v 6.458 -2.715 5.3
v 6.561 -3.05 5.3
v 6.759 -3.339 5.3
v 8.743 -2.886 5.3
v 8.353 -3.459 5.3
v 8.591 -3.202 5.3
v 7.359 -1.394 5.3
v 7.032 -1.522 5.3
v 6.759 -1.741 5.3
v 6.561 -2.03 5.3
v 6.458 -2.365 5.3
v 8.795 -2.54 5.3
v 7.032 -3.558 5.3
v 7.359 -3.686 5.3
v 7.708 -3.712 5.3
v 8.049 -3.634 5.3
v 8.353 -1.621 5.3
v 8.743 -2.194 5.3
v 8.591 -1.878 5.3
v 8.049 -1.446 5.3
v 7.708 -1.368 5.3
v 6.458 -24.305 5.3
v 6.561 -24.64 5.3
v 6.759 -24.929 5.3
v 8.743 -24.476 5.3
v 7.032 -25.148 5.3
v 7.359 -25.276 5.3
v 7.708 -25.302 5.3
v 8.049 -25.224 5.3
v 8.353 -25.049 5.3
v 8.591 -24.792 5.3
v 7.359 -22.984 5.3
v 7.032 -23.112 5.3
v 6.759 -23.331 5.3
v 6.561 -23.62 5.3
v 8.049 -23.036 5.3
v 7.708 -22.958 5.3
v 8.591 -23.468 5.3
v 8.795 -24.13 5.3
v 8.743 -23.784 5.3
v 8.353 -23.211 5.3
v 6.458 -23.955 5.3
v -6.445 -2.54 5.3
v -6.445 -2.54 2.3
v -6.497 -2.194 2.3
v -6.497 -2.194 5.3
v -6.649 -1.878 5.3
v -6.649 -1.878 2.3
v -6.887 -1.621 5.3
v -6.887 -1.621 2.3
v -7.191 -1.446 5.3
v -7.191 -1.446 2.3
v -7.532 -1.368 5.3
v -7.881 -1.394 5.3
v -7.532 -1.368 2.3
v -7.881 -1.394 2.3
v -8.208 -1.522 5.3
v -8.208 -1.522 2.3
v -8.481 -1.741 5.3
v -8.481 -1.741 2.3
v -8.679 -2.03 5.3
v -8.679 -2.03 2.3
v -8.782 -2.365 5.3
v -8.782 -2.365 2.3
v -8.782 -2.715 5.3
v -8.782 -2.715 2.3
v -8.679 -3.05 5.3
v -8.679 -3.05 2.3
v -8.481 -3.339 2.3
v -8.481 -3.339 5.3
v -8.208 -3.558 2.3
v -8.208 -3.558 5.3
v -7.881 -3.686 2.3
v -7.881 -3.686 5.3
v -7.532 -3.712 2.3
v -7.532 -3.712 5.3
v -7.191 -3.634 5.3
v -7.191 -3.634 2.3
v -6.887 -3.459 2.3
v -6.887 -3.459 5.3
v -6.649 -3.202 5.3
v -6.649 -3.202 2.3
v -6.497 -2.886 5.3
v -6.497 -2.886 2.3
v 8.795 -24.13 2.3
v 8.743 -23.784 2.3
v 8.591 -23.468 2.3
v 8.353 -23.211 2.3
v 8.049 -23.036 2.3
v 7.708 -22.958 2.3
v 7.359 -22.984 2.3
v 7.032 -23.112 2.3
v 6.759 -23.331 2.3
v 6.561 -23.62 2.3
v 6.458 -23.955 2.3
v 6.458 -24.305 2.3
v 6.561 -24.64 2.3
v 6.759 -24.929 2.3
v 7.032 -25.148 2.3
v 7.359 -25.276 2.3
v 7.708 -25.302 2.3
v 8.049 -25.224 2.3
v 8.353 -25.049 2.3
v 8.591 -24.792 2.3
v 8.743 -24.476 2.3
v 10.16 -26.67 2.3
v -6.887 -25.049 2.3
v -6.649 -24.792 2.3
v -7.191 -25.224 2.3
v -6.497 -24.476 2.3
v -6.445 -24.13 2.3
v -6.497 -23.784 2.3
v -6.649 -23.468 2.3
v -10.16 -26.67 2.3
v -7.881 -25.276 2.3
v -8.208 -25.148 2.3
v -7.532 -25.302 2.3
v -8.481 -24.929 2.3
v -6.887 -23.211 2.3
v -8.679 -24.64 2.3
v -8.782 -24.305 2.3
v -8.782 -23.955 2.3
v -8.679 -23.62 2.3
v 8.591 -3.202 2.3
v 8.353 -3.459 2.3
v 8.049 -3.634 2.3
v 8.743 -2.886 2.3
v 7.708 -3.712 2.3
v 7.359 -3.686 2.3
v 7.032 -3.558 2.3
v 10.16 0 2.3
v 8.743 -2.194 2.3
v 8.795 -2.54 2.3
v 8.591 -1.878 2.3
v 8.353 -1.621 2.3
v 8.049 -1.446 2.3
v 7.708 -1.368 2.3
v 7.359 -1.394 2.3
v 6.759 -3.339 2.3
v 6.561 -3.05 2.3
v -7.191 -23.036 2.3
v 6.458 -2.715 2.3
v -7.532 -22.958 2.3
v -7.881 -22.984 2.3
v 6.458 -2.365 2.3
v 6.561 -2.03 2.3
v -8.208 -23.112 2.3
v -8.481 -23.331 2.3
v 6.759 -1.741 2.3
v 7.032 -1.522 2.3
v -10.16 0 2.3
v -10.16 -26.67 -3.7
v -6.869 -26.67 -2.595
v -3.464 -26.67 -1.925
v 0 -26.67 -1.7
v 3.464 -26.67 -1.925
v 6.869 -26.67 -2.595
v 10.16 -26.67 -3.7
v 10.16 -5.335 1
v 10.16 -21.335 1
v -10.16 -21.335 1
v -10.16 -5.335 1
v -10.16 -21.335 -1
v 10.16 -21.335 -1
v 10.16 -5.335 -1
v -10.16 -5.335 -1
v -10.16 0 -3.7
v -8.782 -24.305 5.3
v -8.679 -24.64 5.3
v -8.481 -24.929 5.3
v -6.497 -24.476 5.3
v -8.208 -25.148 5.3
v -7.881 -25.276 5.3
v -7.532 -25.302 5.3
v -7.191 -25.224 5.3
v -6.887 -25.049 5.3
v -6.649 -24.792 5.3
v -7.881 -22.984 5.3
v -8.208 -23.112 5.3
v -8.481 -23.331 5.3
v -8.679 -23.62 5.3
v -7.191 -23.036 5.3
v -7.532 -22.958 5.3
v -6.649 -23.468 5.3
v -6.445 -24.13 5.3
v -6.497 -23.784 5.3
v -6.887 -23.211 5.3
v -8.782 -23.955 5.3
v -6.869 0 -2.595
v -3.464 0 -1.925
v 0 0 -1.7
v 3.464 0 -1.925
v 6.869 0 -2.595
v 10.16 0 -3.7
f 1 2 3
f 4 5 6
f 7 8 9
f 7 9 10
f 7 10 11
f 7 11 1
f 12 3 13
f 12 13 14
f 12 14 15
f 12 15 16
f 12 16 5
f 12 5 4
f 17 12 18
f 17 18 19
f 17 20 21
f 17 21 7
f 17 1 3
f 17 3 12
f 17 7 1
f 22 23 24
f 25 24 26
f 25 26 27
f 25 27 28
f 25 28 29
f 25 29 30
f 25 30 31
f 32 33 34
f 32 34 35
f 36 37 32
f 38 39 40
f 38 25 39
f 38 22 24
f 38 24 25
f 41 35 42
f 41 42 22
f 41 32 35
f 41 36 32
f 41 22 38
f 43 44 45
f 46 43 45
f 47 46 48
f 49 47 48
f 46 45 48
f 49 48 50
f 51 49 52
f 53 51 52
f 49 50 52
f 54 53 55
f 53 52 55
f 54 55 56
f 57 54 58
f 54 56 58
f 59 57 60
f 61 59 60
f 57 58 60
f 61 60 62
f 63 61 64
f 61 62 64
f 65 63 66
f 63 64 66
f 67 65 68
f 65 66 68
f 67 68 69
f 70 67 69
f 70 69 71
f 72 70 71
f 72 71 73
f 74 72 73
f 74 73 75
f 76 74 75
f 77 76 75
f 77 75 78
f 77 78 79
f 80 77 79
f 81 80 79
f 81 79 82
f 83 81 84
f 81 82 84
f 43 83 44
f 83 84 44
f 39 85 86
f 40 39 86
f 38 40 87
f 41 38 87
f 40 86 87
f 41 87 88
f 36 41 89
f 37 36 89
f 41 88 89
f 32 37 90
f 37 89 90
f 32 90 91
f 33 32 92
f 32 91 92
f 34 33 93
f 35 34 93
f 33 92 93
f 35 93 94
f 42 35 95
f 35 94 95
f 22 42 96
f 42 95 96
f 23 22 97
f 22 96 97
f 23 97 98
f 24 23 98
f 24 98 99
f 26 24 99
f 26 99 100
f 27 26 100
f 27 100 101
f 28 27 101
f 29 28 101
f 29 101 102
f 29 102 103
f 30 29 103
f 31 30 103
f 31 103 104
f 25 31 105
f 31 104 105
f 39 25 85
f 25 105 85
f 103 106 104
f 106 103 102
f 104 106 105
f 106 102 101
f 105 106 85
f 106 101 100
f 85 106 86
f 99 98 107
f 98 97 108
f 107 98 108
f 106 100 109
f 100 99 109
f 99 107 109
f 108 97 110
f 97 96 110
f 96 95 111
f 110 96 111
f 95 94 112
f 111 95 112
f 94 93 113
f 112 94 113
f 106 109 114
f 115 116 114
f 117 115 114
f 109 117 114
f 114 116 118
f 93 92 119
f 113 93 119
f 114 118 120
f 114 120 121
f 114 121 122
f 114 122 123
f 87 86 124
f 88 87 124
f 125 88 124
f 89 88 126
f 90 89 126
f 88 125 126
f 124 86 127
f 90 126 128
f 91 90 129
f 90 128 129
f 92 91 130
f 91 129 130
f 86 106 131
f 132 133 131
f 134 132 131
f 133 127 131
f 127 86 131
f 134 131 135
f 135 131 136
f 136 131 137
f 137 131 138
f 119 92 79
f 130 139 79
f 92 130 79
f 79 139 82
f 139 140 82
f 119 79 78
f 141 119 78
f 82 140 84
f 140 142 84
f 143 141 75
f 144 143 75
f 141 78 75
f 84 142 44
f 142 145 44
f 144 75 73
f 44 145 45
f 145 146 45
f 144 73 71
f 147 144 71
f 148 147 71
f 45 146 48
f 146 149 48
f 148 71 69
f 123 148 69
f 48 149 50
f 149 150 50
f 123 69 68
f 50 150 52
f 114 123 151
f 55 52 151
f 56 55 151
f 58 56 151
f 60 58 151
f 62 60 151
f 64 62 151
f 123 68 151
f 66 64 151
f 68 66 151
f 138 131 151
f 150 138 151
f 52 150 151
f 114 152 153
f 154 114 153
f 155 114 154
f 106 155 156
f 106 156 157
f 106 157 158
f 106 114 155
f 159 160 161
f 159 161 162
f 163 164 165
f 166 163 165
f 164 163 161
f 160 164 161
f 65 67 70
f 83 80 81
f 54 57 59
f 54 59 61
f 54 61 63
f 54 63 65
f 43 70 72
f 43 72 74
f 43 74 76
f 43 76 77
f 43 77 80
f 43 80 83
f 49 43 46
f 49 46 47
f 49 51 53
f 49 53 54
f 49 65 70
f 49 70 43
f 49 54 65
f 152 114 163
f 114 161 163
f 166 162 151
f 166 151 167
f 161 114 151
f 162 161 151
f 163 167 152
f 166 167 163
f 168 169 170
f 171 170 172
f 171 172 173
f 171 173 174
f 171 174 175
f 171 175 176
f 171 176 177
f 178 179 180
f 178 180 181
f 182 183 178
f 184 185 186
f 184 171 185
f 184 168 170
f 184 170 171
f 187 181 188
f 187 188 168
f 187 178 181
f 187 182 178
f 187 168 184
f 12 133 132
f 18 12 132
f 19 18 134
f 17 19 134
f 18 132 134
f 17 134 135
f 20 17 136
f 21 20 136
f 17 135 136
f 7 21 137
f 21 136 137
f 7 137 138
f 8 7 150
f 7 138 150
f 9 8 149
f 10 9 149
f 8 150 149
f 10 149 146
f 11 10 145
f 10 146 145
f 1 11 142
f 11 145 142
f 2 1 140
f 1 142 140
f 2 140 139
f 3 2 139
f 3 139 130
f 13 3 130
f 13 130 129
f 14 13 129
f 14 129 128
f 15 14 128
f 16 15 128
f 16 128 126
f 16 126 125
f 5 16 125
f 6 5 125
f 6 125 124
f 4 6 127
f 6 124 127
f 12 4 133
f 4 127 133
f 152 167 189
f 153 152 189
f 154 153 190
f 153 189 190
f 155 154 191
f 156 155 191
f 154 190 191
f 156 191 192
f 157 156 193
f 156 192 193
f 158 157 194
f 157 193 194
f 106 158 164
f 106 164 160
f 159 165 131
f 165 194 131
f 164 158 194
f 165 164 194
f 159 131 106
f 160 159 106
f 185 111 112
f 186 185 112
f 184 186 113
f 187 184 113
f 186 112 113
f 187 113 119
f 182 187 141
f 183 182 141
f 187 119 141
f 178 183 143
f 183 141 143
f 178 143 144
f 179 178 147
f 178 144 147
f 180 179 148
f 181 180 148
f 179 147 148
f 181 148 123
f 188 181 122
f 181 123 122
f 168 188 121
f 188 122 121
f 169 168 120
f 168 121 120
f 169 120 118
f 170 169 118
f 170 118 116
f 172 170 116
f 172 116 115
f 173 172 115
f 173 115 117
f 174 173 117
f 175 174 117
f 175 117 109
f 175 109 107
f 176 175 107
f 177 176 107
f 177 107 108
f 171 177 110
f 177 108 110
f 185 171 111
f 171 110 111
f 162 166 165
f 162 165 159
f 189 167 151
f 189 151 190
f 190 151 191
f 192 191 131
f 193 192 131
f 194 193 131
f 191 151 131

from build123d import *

# Parameters (mm, degrees)
F1_DEPTH = 26.67
F2_W     = 16
F2_H     = 2
F3_DEPTH = 20.32
F4_R     = 1.175
F5_DEPTH = 3


with BuildPart() as f1:
    # F0 (on Front) → F1 (new body)
    with BuildSketch(Plane.XZ):
        with BuildLine():
            ThreePointArc((-10.16, -3.7), (0, -1.7), (10.16, -3.7))
            Line((10.16, -3.7), (10.16, 2.3))
            Line((10.16, 2.3), (-10.16, 2.3))
            Line((-10.16, 2.3), (-10.16, -3.7))
        make_face()
    extrude(amount=F1_DEPTH)

    # F2 (on face) → F3 (cut, through all)
    with BuildSketch(Plane.YZ.offset(10.16)):
        with Locations((-13.335, 0)):
            Rectangle(F2_W, F2_H)
    extrude(amount=-F3_DEPTH, mode=Mode.SUBTRACT)

    # F4 (on face) → F5 (join)
    with BuildSketch(Plane.XY.offset(2.3)):
        with Locations((7.62, -2.54)):
            Circle(F4_R)
        with Locations((7.62, -24.13)):
            Circle(F4_R)
        with Locations((-7.62, -2.54)):
            Circle(F4_R)
        with Locations((-7.62, -24.13)):
            Circle(F4_R)
    extrude(amount=F5_DEPTH)


solid = f1.part
